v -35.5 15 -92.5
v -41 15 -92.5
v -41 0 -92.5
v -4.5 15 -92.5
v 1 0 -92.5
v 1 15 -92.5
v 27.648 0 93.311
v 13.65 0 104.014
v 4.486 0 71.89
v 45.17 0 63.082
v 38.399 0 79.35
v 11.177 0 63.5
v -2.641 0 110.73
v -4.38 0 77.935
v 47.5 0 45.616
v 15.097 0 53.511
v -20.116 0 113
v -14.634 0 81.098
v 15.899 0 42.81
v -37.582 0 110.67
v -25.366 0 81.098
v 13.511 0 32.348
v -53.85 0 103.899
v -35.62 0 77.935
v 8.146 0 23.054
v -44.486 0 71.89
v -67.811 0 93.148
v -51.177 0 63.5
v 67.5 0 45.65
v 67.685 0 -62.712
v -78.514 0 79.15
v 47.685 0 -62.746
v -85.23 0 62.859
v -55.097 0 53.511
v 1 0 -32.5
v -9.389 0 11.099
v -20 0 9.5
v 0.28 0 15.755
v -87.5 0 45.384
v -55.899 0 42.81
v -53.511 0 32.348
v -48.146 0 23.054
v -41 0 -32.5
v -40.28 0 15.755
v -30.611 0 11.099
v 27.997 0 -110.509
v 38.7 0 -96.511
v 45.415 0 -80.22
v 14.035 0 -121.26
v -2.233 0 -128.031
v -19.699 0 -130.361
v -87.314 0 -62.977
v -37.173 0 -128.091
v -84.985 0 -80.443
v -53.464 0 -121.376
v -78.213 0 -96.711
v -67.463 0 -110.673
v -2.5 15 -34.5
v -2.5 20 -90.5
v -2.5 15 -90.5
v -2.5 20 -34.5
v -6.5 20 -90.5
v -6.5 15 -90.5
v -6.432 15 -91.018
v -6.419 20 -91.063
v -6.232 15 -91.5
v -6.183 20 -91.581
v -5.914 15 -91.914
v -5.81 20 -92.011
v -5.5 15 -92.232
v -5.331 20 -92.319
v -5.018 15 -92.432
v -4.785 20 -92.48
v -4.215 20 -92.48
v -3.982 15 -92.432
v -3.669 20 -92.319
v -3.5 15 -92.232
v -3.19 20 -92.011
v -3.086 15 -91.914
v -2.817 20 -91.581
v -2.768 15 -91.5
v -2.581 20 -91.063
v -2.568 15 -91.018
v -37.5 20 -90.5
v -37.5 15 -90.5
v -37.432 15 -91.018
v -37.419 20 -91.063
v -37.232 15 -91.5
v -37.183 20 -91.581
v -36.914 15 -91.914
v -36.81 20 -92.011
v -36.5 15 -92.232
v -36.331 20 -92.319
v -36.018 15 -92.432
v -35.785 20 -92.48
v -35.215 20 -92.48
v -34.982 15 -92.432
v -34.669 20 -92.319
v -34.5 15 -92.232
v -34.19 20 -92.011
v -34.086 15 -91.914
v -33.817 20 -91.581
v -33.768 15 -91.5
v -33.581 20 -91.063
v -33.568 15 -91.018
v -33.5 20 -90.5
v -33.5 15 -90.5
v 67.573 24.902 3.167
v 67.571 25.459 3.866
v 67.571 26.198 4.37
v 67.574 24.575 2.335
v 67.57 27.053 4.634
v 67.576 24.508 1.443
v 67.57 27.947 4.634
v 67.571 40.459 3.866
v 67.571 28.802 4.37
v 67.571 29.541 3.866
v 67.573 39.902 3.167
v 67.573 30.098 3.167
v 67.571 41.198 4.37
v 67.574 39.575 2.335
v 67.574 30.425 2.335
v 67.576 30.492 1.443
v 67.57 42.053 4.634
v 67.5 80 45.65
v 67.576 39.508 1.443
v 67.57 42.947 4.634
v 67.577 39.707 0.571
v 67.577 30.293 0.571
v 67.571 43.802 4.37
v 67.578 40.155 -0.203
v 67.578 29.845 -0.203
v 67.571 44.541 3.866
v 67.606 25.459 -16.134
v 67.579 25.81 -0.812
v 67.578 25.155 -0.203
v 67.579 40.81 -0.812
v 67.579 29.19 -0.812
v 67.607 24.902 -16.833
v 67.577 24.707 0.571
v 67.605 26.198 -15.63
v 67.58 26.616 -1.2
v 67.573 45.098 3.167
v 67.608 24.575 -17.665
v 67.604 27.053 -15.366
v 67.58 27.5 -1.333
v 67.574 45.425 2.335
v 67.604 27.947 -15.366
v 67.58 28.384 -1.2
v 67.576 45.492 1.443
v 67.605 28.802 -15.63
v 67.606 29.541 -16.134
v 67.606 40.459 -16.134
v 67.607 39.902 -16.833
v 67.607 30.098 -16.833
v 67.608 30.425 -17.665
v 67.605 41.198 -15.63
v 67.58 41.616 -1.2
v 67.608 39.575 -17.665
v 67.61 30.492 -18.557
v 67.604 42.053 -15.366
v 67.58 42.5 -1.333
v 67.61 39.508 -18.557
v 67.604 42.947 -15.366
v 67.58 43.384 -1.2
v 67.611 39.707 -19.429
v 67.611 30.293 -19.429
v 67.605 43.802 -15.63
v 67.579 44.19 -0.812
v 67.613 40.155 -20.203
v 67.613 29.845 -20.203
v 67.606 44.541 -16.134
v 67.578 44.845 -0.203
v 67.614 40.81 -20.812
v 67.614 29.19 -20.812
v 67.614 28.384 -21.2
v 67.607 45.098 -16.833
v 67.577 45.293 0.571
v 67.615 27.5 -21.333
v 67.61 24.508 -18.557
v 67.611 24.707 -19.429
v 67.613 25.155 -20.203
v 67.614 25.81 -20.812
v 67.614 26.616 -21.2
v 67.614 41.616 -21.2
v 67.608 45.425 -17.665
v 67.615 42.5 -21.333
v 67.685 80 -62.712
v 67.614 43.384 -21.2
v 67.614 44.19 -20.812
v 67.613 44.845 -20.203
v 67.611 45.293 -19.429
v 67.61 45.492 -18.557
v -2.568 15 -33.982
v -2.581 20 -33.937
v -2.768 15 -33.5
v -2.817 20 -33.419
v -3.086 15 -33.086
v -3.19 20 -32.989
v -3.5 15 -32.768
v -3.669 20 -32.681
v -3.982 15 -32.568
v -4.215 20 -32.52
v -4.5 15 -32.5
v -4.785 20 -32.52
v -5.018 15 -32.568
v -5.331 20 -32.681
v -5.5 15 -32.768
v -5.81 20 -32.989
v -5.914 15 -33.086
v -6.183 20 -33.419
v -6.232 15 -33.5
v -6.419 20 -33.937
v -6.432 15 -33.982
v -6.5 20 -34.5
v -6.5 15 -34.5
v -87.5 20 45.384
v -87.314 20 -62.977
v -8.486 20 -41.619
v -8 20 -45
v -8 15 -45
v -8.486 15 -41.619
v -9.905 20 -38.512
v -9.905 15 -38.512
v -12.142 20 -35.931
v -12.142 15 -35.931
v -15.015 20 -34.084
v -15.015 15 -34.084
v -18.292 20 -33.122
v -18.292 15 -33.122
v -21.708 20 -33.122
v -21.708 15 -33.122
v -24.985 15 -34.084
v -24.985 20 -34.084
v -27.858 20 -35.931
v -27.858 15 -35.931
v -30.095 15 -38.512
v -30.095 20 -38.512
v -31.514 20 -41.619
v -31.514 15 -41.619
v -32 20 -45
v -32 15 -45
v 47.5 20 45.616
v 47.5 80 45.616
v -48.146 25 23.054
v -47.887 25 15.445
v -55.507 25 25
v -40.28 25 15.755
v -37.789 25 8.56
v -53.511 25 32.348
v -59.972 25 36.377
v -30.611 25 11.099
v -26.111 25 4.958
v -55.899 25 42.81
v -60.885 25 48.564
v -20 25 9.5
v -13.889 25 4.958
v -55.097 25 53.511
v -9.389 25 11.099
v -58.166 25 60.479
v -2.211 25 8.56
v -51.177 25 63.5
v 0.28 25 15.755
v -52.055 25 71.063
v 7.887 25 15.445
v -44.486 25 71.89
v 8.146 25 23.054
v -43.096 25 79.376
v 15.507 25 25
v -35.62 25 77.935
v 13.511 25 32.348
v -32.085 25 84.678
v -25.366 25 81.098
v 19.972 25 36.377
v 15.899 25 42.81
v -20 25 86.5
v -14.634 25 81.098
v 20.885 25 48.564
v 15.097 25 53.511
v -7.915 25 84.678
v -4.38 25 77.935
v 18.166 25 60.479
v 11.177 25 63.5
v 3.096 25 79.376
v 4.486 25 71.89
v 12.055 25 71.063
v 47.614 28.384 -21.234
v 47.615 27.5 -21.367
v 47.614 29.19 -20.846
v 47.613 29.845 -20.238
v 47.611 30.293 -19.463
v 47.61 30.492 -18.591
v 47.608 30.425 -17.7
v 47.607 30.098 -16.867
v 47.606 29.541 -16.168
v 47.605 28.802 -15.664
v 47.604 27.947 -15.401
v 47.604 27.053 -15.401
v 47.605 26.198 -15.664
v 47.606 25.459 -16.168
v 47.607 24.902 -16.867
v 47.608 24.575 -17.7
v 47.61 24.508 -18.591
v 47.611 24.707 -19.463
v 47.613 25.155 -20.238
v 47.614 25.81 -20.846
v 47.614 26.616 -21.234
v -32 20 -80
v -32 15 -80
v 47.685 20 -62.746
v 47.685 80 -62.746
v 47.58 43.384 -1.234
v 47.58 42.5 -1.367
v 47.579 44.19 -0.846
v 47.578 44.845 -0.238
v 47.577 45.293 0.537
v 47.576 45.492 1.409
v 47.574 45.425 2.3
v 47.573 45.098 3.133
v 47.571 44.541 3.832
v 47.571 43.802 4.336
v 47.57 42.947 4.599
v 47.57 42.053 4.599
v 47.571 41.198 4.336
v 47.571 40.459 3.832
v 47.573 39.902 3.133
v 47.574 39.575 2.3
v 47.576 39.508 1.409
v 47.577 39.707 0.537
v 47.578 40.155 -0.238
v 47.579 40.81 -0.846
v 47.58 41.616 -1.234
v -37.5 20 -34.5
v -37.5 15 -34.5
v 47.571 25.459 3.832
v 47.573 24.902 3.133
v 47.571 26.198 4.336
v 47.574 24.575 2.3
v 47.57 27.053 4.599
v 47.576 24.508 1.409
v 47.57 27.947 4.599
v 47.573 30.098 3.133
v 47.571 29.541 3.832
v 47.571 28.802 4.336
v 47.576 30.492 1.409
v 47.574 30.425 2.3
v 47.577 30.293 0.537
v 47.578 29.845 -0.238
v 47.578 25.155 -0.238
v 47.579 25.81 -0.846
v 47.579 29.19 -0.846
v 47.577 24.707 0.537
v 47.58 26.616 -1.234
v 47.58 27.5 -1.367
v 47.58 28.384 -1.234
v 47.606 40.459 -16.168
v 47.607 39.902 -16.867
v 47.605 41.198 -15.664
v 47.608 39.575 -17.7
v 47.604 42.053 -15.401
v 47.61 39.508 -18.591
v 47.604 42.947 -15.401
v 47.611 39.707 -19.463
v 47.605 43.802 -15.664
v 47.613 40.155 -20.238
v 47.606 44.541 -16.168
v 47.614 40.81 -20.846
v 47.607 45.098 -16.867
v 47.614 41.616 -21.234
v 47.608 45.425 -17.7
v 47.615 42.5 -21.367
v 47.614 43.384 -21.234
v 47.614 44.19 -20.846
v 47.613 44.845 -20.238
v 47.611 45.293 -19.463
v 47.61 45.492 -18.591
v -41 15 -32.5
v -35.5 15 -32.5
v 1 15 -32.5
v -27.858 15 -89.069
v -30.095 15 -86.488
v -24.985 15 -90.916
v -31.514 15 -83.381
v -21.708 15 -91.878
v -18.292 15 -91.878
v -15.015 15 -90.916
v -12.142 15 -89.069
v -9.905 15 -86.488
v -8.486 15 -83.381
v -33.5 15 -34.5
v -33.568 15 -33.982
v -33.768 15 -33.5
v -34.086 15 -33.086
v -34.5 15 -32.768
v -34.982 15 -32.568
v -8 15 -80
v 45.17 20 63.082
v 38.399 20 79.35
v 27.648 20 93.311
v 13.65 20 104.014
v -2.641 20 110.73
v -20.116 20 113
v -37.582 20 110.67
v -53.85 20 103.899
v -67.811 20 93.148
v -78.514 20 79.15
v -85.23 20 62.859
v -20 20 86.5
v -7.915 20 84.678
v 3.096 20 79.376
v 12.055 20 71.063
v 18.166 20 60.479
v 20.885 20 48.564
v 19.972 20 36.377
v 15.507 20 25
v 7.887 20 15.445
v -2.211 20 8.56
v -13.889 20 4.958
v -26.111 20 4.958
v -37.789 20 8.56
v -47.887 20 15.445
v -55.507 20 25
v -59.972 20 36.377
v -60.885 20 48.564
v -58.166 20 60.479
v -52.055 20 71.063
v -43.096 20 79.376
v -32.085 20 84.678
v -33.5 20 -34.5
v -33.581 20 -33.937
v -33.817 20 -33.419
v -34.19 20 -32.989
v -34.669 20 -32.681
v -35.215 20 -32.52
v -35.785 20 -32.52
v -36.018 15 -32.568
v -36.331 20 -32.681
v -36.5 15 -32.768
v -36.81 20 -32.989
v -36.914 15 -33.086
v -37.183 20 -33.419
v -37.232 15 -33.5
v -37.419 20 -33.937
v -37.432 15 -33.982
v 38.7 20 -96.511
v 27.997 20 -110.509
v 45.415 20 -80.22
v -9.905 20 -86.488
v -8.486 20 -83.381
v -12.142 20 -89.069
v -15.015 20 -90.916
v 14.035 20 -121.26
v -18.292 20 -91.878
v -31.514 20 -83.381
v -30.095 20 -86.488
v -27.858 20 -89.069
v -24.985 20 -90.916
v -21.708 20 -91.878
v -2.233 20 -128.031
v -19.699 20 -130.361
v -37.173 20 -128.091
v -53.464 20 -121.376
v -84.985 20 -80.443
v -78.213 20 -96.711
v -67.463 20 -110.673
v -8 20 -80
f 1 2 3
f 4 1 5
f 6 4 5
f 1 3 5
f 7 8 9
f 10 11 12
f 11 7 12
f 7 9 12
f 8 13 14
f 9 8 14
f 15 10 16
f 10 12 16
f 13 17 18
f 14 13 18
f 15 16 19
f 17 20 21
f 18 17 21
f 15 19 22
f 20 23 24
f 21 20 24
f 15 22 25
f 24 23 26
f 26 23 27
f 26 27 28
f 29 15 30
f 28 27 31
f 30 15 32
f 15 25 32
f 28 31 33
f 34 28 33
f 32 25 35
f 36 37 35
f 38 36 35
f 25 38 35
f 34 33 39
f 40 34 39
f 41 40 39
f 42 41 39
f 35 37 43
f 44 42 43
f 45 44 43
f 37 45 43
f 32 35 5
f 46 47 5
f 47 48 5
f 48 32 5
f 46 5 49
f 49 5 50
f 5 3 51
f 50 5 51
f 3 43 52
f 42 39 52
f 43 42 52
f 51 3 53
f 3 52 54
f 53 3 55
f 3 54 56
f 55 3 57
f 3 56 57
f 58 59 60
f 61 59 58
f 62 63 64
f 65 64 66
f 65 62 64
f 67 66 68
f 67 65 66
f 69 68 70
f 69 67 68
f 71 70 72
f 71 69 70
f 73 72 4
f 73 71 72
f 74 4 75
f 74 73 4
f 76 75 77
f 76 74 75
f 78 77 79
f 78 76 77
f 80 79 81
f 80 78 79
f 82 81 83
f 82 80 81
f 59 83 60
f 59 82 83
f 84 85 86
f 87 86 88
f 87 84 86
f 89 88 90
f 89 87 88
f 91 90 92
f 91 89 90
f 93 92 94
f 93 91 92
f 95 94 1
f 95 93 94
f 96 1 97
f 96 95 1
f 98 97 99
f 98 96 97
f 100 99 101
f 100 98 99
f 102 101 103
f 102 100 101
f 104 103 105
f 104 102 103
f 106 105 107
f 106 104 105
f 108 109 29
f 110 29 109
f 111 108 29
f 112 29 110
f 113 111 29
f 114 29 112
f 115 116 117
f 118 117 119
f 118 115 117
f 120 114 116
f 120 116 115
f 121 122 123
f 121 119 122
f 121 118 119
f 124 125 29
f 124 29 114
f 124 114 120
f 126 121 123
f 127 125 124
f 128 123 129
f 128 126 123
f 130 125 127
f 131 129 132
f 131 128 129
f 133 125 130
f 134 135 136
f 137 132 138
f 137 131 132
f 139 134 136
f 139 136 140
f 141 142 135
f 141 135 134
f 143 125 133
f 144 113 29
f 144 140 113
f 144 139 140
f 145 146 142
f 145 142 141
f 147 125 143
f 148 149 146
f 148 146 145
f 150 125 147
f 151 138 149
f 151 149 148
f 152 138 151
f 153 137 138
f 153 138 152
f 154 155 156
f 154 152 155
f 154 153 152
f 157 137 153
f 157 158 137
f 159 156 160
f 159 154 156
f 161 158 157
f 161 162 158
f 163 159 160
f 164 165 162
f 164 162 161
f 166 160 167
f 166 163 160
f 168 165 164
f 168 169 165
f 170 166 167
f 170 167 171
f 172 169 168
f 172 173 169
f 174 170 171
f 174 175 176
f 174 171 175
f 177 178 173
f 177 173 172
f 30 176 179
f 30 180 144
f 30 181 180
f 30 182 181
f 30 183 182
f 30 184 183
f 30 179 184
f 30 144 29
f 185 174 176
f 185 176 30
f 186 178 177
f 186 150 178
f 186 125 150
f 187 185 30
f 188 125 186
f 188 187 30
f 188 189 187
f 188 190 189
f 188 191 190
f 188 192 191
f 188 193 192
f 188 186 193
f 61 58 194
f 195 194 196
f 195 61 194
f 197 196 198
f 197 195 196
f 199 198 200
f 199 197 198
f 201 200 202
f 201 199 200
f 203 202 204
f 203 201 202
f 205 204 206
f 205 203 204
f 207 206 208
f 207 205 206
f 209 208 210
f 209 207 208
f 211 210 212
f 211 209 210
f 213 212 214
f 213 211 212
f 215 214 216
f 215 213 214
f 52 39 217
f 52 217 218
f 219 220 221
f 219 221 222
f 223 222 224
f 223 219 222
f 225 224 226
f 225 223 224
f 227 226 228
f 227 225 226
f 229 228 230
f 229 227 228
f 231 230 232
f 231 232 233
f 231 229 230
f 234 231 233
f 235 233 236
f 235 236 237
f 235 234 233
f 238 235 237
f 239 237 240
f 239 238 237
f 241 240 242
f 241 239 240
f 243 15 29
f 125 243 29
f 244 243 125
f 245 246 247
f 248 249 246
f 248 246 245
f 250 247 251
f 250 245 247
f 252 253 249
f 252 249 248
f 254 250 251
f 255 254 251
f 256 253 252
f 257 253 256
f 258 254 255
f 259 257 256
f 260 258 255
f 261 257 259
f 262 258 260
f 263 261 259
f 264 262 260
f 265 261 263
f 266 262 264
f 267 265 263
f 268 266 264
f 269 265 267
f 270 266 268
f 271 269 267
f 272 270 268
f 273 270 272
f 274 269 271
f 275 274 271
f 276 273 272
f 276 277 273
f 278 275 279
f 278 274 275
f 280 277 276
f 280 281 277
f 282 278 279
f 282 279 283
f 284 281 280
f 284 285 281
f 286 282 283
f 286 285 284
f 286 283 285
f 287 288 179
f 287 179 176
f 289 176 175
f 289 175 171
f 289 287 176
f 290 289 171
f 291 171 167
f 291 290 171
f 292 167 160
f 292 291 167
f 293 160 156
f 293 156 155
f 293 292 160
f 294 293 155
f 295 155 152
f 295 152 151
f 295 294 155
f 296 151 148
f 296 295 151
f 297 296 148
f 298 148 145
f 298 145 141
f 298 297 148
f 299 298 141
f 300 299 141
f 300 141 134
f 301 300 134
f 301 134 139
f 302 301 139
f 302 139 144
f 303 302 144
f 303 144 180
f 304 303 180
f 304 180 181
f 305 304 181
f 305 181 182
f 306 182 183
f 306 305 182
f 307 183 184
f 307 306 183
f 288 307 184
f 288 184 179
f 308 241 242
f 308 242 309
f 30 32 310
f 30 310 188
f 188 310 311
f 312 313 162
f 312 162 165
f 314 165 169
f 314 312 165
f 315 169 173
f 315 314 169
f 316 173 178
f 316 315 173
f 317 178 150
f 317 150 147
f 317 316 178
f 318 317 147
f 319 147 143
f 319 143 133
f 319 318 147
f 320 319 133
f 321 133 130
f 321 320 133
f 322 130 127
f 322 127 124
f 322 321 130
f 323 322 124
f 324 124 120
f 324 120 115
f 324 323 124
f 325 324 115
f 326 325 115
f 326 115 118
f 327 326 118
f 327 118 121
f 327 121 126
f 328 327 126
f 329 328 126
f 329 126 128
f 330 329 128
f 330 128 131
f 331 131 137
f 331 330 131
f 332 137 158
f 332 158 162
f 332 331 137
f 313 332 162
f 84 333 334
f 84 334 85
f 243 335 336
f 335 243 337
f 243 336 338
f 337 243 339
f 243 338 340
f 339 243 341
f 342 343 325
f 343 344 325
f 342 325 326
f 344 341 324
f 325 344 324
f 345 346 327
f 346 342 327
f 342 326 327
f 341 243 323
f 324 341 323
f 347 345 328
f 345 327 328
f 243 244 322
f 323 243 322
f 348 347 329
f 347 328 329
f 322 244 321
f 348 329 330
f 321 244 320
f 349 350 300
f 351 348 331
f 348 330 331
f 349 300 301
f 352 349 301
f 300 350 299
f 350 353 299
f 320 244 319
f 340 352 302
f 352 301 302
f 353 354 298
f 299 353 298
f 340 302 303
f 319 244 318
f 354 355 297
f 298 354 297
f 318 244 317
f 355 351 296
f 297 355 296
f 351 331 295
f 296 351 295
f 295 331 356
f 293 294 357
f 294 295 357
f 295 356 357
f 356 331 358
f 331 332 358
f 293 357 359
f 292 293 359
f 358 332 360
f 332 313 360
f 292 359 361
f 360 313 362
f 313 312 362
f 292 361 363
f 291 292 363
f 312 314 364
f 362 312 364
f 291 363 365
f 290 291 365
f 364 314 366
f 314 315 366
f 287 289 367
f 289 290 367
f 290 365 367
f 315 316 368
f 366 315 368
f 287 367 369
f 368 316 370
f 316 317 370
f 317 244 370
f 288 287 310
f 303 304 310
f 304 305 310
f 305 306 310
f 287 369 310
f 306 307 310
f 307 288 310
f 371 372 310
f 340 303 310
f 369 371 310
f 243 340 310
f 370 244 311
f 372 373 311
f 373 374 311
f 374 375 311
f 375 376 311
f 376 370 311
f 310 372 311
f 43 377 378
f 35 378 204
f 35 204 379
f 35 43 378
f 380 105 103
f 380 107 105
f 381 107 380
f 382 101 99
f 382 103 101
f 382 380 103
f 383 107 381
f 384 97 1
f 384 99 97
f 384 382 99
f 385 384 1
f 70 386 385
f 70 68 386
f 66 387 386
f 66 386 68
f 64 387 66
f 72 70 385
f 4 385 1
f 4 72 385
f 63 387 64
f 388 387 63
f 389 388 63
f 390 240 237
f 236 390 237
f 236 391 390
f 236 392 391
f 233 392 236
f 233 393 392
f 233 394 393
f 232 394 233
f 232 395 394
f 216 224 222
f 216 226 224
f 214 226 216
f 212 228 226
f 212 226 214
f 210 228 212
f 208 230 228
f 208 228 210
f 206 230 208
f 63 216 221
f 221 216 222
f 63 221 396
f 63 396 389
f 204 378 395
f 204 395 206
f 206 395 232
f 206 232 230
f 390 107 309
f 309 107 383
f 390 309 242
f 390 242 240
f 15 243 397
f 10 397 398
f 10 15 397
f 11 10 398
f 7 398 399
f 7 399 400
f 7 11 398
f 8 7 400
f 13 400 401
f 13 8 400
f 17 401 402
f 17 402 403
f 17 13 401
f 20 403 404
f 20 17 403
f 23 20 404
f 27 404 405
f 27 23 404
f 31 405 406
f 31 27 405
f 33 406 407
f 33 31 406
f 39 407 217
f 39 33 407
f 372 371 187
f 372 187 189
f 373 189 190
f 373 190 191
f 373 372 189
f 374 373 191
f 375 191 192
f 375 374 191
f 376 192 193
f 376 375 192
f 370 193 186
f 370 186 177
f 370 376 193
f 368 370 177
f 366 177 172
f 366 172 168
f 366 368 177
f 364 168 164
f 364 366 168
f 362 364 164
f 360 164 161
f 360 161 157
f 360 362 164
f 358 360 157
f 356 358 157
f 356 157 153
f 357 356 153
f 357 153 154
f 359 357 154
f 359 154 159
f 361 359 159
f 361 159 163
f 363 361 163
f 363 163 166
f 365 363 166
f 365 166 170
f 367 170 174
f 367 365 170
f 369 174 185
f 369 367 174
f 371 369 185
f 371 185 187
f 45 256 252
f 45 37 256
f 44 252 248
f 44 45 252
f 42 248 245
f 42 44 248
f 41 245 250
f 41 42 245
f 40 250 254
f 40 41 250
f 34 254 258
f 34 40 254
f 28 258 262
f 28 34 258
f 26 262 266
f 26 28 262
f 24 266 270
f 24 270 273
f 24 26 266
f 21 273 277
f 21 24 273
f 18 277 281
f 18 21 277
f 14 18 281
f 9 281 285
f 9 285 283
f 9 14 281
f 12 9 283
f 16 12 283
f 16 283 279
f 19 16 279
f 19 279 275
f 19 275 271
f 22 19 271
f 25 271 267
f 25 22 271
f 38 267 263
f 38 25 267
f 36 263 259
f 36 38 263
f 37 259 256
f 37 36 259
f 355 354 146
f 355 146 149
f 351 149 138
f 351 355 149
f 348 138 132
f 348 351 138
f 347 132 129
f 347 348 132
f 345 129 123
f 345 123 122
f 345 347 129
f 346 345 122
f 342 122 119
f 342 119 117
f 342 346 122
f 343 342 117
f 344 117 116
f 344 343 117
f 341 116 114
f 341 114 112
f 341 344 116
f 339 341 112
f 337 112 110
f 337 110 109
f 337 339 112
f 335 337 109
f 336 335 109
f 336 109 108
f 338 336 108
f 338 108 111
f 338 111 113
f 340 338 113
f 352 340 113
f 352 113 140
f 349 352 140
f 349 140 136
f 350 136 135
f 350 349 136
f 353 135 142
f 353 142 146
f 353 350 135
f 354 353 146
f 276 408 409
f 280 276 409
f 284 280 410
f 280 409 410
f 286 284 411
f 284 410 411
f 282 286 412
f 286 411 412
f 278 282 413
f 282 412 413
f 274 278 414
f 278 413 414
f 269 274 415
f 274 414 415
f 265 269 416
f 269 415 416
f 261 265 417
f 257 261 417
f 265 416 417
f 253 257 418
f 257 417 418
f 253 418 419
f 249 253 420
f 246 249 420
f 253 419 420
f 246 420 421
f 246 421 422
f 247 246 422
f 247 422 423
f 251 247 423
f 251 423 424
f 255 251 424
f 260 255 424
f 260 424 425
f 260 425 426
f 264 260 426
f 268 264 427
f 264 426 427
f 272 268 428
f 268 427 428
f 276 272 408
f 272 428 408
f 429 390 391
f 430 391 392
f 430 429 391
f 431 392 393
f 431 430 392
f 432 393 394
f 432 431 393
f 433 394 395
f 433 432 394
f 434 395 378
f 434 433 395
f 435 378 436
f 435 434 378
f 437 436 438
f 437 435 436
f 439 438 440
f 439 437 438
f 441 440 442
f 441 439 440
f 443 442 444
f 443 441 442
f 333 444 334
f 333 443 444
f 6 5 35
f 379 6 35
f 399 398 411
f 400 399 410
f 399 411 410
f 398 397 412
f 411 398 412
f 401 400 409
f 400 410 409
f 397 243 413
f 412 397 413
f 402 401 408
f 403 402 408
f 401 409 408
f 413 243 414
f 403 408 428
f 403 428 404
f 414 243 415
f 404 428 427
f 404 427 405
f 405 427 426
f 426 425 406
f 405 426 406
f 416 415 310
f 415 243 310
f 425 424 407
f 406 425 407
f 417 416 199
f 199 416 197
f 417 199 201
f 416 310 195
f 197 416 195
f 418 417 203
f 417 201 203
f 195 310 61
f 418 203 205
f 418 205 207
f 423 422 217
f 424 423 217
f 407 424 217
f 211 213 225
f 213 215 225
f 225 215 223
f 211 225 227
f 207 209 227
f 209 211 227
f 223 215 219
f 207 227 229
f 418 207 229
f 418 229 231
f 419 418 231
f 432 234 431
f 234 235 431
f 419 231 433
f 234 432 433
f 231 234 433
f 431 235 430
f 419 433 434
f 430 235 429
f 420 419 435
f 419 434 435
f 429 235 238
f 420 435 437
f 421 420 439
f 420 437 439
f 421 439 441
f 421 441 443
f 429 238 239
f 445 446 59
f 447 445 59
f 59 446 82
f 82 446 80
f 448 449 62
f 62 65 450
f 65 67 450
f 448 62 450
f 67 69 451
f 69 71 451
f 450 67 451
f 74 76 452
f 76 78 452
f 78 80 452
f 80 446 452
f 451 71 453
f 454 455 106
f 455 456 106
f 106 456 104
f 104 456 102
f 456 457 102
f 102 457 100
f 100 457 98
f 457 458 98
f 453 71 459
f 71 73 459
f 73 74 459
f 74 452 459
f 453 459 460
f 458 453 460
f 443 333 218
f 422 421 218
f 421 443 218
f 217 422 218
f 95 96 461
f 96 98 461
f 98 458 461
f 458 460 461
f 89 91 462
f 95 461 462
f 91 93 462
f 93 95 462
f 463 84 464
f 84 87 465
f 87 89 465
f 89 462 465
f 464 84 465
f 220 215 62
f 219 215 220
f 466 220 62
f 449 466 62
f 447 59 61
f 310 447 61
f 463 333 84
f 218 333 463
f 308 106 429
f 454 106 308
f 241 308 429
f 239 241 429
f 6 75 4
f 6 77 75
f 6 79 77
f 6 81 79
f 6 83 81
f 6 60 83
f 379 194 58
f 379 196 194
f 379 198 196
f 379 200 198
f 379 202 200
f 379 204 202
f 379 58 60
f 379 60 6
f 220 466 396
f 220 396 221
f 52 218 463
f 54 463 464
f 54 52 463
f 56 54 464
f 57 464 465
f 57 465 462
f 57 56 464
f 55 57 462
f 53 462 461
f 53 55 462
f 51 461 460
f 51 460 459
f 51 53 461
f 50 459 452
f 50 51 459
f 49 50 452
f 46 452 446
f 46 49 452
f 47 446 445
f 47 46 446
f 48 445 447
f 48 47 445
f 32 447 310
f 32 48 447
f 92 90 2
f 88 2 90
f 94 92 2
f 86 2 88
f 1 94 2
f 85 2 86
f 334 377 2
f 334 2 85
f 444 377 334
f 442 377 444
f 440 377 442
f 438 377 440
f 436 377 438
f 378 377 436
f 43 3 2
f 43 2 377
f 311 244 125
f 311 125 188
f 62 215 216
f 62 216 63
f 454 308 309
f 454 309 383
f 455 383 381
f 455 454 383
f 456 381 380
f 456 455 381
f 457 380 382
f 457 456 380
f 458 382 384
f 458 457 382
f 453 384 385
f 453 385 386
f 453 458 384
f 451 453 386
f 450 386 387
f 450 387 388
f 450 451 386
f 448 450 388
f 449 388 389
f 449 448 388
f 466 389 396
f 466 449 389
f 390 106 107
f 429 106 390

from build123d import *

# Parameters (mm, degrees)
BOSS_EXTRUDE1_DEPTH = 20
SKETCH8_W           = 42
SKETCH8_H           = 60
CUT_EXTRUDE1_DEPTH  = 15
CUT_EXTRUDE2_START  = -5
CUT_EXTRUDE2_DEPTH  = 5
SKETCH10_R          = 36
CUT_EXTRUDE3_DEPTH  = 159.272933389
SKETCH11_R          = 41
SKETCH11_R_2        = 36
BOSS_EXTRUDE4_DEPTH = 5
SKETCH2_W           = 108.361469825
SKETCH2_H           = 80
SKETCH2_R           = 3
BOSS_EXTRUDE6_DEPTH = 20


# Read off the part's stored shape, not the designer's step: Cut-Extrude2
with BuildPart() as part:
    # Sketch1 → Boss-Extrude1 (new body)
    with BuildSketch(Plane(origin=(0, 0, 0), x_dir=(1, 0, 0), z_dir=(0, 1, 0))):
        with BuildLine():
            Line((47.685345344, 62.745795153), (47.499901156, -45.615515992))
            ThreePointArc((47.499901156, -45.615515992), (-20.115515992, -112.999901156), (-87.499901156, -45.384484008))
            Line((-87.499901156, -45.384484008), (-87.314456968, 62.976827137))
            ThreePointArc((-87.314456968, 62.976827137), (-19.69903982, 130.361212301), (47.685345344, 62.745795153))
        make_face()
    extrude(amount=BOSS_EXTRUDE1_DEPTH)

    # Sketch8 → Cut-Extrude1 (cut)
    with BuildSketch(Plane.XZ):
        with Locations((-20, -62.5)):
            Rectangle(SKETCH8_W, SKETCH8_H)
    extrude(amount=-CUT_EXTRUDE1_DEPTH, mode=Mode.SUBTRACT)

    # Cut-Extrude2 outline → Cut-Extrude2 (cut)
    with BuildSketch(Plane.XZ.offset(-15).offset(CUT_EXTRUDE2_START)):
        with BuildLine():
            Line((-6.5, -34.5), (-6.5, -90.5))
            ThreePointArc((-6.5, -90.5), (-4.5, -92.5), (-2.5, -90.5))
            Line((-2.5, -90.5), (-2.5, -34.5))
            ThreePointArc((-2.5, -34.5), (-4.5, -32.5), (-6.5, -34.5))
        make_face()
        with BuildLine():
            ThreePointArc((-8, -45), (-20, -33), (-32, -45))
            Line((-32, -45), (-32, -80))
            ThreePointArc((-32, -80), (-20, -92), (-8, -80))
            Line((-8, -80), (-8, -45))
        make_face()
        with BuildLine():
            Line((-37.5, -34.5), (-37.5, -90.5))
            ThreePointArc((-37.5, -90.5), (-35.5, -92.5), (-33.5, -90.5))
            Line((-33.5, -90.5), (-33.5, -34.5))
            ThreePointArc((-33.5, -34.5), (-35.5, -32.5), (-37.5, -34.5))
        make_face()
    extrude(amount=CUT_EXTRUDE2_DEPTH, mode=Mode.SUBTRACT)

    # Sketch10 → Cut-Extrude3 (cut, through all)
    with BuildSketch(Plane.XZ):
        with Locations(Location((-20, 45.5, 0), (0, 0, 270))):
            Circle(SKETCH10_R)
    extrude(amount=-CUT_EXTRUDE3_DEPTH, mode=Mode.SUBTRACT)

    # Sketch11 → Boss-Extrude4 (add)
    with BuildSketch(Plane(origin=(0, 20, 0), x_dir=(1, 0, 0), z_dir=(0, 1, 0))):
        with Locations(Location((-20, -45.5, 0), (0, 0, 270))):
            Circle(SKETCH11_R)
        with Locations(Location((-20, -45.5, 0), (0, 0, 90))):
            Circle(SKETCH11_R_2, mode=Mode.SUBTRACT)
    extrude(amount=BOSS_EXTRUDE4_DEPTH)

    # Sketch2 → Boss-Extrude6 (add)
    with BuildSketch(Plane(origin=(47.577825951, 0, 0.081422338), x_dir=(0.0017113480294572096, 0, -0.9999985356428889), z_dir=(0.999998535642889, 0, 0.0017113480294572096))):
        with Locations((8.64657458, 40)):
            Rectangle(SKETCH2_W, SKETCH2_H)
        with Locations((-1.551375347, 27.5)):
            Circle(SKETCH2_R, mode=Mode.SUBTRACT)
        with Locations((18.448624653, 27.5)):
            Circle(SKETCH2_R, mode=Mode.SUBTRACT)
        with Locations((18.448624653, 42.5)):
            Circle(SKETCH2_R, mode=Mode.SUBTRACT)
        with Locations((-1.551375347, 42.5)):
            Circle(SKETCH2_R, mode=Mode.SUBTRACT)
    extrude(amount=BOSS_EXTRUDE6_DEPTH)


solid = part.part
